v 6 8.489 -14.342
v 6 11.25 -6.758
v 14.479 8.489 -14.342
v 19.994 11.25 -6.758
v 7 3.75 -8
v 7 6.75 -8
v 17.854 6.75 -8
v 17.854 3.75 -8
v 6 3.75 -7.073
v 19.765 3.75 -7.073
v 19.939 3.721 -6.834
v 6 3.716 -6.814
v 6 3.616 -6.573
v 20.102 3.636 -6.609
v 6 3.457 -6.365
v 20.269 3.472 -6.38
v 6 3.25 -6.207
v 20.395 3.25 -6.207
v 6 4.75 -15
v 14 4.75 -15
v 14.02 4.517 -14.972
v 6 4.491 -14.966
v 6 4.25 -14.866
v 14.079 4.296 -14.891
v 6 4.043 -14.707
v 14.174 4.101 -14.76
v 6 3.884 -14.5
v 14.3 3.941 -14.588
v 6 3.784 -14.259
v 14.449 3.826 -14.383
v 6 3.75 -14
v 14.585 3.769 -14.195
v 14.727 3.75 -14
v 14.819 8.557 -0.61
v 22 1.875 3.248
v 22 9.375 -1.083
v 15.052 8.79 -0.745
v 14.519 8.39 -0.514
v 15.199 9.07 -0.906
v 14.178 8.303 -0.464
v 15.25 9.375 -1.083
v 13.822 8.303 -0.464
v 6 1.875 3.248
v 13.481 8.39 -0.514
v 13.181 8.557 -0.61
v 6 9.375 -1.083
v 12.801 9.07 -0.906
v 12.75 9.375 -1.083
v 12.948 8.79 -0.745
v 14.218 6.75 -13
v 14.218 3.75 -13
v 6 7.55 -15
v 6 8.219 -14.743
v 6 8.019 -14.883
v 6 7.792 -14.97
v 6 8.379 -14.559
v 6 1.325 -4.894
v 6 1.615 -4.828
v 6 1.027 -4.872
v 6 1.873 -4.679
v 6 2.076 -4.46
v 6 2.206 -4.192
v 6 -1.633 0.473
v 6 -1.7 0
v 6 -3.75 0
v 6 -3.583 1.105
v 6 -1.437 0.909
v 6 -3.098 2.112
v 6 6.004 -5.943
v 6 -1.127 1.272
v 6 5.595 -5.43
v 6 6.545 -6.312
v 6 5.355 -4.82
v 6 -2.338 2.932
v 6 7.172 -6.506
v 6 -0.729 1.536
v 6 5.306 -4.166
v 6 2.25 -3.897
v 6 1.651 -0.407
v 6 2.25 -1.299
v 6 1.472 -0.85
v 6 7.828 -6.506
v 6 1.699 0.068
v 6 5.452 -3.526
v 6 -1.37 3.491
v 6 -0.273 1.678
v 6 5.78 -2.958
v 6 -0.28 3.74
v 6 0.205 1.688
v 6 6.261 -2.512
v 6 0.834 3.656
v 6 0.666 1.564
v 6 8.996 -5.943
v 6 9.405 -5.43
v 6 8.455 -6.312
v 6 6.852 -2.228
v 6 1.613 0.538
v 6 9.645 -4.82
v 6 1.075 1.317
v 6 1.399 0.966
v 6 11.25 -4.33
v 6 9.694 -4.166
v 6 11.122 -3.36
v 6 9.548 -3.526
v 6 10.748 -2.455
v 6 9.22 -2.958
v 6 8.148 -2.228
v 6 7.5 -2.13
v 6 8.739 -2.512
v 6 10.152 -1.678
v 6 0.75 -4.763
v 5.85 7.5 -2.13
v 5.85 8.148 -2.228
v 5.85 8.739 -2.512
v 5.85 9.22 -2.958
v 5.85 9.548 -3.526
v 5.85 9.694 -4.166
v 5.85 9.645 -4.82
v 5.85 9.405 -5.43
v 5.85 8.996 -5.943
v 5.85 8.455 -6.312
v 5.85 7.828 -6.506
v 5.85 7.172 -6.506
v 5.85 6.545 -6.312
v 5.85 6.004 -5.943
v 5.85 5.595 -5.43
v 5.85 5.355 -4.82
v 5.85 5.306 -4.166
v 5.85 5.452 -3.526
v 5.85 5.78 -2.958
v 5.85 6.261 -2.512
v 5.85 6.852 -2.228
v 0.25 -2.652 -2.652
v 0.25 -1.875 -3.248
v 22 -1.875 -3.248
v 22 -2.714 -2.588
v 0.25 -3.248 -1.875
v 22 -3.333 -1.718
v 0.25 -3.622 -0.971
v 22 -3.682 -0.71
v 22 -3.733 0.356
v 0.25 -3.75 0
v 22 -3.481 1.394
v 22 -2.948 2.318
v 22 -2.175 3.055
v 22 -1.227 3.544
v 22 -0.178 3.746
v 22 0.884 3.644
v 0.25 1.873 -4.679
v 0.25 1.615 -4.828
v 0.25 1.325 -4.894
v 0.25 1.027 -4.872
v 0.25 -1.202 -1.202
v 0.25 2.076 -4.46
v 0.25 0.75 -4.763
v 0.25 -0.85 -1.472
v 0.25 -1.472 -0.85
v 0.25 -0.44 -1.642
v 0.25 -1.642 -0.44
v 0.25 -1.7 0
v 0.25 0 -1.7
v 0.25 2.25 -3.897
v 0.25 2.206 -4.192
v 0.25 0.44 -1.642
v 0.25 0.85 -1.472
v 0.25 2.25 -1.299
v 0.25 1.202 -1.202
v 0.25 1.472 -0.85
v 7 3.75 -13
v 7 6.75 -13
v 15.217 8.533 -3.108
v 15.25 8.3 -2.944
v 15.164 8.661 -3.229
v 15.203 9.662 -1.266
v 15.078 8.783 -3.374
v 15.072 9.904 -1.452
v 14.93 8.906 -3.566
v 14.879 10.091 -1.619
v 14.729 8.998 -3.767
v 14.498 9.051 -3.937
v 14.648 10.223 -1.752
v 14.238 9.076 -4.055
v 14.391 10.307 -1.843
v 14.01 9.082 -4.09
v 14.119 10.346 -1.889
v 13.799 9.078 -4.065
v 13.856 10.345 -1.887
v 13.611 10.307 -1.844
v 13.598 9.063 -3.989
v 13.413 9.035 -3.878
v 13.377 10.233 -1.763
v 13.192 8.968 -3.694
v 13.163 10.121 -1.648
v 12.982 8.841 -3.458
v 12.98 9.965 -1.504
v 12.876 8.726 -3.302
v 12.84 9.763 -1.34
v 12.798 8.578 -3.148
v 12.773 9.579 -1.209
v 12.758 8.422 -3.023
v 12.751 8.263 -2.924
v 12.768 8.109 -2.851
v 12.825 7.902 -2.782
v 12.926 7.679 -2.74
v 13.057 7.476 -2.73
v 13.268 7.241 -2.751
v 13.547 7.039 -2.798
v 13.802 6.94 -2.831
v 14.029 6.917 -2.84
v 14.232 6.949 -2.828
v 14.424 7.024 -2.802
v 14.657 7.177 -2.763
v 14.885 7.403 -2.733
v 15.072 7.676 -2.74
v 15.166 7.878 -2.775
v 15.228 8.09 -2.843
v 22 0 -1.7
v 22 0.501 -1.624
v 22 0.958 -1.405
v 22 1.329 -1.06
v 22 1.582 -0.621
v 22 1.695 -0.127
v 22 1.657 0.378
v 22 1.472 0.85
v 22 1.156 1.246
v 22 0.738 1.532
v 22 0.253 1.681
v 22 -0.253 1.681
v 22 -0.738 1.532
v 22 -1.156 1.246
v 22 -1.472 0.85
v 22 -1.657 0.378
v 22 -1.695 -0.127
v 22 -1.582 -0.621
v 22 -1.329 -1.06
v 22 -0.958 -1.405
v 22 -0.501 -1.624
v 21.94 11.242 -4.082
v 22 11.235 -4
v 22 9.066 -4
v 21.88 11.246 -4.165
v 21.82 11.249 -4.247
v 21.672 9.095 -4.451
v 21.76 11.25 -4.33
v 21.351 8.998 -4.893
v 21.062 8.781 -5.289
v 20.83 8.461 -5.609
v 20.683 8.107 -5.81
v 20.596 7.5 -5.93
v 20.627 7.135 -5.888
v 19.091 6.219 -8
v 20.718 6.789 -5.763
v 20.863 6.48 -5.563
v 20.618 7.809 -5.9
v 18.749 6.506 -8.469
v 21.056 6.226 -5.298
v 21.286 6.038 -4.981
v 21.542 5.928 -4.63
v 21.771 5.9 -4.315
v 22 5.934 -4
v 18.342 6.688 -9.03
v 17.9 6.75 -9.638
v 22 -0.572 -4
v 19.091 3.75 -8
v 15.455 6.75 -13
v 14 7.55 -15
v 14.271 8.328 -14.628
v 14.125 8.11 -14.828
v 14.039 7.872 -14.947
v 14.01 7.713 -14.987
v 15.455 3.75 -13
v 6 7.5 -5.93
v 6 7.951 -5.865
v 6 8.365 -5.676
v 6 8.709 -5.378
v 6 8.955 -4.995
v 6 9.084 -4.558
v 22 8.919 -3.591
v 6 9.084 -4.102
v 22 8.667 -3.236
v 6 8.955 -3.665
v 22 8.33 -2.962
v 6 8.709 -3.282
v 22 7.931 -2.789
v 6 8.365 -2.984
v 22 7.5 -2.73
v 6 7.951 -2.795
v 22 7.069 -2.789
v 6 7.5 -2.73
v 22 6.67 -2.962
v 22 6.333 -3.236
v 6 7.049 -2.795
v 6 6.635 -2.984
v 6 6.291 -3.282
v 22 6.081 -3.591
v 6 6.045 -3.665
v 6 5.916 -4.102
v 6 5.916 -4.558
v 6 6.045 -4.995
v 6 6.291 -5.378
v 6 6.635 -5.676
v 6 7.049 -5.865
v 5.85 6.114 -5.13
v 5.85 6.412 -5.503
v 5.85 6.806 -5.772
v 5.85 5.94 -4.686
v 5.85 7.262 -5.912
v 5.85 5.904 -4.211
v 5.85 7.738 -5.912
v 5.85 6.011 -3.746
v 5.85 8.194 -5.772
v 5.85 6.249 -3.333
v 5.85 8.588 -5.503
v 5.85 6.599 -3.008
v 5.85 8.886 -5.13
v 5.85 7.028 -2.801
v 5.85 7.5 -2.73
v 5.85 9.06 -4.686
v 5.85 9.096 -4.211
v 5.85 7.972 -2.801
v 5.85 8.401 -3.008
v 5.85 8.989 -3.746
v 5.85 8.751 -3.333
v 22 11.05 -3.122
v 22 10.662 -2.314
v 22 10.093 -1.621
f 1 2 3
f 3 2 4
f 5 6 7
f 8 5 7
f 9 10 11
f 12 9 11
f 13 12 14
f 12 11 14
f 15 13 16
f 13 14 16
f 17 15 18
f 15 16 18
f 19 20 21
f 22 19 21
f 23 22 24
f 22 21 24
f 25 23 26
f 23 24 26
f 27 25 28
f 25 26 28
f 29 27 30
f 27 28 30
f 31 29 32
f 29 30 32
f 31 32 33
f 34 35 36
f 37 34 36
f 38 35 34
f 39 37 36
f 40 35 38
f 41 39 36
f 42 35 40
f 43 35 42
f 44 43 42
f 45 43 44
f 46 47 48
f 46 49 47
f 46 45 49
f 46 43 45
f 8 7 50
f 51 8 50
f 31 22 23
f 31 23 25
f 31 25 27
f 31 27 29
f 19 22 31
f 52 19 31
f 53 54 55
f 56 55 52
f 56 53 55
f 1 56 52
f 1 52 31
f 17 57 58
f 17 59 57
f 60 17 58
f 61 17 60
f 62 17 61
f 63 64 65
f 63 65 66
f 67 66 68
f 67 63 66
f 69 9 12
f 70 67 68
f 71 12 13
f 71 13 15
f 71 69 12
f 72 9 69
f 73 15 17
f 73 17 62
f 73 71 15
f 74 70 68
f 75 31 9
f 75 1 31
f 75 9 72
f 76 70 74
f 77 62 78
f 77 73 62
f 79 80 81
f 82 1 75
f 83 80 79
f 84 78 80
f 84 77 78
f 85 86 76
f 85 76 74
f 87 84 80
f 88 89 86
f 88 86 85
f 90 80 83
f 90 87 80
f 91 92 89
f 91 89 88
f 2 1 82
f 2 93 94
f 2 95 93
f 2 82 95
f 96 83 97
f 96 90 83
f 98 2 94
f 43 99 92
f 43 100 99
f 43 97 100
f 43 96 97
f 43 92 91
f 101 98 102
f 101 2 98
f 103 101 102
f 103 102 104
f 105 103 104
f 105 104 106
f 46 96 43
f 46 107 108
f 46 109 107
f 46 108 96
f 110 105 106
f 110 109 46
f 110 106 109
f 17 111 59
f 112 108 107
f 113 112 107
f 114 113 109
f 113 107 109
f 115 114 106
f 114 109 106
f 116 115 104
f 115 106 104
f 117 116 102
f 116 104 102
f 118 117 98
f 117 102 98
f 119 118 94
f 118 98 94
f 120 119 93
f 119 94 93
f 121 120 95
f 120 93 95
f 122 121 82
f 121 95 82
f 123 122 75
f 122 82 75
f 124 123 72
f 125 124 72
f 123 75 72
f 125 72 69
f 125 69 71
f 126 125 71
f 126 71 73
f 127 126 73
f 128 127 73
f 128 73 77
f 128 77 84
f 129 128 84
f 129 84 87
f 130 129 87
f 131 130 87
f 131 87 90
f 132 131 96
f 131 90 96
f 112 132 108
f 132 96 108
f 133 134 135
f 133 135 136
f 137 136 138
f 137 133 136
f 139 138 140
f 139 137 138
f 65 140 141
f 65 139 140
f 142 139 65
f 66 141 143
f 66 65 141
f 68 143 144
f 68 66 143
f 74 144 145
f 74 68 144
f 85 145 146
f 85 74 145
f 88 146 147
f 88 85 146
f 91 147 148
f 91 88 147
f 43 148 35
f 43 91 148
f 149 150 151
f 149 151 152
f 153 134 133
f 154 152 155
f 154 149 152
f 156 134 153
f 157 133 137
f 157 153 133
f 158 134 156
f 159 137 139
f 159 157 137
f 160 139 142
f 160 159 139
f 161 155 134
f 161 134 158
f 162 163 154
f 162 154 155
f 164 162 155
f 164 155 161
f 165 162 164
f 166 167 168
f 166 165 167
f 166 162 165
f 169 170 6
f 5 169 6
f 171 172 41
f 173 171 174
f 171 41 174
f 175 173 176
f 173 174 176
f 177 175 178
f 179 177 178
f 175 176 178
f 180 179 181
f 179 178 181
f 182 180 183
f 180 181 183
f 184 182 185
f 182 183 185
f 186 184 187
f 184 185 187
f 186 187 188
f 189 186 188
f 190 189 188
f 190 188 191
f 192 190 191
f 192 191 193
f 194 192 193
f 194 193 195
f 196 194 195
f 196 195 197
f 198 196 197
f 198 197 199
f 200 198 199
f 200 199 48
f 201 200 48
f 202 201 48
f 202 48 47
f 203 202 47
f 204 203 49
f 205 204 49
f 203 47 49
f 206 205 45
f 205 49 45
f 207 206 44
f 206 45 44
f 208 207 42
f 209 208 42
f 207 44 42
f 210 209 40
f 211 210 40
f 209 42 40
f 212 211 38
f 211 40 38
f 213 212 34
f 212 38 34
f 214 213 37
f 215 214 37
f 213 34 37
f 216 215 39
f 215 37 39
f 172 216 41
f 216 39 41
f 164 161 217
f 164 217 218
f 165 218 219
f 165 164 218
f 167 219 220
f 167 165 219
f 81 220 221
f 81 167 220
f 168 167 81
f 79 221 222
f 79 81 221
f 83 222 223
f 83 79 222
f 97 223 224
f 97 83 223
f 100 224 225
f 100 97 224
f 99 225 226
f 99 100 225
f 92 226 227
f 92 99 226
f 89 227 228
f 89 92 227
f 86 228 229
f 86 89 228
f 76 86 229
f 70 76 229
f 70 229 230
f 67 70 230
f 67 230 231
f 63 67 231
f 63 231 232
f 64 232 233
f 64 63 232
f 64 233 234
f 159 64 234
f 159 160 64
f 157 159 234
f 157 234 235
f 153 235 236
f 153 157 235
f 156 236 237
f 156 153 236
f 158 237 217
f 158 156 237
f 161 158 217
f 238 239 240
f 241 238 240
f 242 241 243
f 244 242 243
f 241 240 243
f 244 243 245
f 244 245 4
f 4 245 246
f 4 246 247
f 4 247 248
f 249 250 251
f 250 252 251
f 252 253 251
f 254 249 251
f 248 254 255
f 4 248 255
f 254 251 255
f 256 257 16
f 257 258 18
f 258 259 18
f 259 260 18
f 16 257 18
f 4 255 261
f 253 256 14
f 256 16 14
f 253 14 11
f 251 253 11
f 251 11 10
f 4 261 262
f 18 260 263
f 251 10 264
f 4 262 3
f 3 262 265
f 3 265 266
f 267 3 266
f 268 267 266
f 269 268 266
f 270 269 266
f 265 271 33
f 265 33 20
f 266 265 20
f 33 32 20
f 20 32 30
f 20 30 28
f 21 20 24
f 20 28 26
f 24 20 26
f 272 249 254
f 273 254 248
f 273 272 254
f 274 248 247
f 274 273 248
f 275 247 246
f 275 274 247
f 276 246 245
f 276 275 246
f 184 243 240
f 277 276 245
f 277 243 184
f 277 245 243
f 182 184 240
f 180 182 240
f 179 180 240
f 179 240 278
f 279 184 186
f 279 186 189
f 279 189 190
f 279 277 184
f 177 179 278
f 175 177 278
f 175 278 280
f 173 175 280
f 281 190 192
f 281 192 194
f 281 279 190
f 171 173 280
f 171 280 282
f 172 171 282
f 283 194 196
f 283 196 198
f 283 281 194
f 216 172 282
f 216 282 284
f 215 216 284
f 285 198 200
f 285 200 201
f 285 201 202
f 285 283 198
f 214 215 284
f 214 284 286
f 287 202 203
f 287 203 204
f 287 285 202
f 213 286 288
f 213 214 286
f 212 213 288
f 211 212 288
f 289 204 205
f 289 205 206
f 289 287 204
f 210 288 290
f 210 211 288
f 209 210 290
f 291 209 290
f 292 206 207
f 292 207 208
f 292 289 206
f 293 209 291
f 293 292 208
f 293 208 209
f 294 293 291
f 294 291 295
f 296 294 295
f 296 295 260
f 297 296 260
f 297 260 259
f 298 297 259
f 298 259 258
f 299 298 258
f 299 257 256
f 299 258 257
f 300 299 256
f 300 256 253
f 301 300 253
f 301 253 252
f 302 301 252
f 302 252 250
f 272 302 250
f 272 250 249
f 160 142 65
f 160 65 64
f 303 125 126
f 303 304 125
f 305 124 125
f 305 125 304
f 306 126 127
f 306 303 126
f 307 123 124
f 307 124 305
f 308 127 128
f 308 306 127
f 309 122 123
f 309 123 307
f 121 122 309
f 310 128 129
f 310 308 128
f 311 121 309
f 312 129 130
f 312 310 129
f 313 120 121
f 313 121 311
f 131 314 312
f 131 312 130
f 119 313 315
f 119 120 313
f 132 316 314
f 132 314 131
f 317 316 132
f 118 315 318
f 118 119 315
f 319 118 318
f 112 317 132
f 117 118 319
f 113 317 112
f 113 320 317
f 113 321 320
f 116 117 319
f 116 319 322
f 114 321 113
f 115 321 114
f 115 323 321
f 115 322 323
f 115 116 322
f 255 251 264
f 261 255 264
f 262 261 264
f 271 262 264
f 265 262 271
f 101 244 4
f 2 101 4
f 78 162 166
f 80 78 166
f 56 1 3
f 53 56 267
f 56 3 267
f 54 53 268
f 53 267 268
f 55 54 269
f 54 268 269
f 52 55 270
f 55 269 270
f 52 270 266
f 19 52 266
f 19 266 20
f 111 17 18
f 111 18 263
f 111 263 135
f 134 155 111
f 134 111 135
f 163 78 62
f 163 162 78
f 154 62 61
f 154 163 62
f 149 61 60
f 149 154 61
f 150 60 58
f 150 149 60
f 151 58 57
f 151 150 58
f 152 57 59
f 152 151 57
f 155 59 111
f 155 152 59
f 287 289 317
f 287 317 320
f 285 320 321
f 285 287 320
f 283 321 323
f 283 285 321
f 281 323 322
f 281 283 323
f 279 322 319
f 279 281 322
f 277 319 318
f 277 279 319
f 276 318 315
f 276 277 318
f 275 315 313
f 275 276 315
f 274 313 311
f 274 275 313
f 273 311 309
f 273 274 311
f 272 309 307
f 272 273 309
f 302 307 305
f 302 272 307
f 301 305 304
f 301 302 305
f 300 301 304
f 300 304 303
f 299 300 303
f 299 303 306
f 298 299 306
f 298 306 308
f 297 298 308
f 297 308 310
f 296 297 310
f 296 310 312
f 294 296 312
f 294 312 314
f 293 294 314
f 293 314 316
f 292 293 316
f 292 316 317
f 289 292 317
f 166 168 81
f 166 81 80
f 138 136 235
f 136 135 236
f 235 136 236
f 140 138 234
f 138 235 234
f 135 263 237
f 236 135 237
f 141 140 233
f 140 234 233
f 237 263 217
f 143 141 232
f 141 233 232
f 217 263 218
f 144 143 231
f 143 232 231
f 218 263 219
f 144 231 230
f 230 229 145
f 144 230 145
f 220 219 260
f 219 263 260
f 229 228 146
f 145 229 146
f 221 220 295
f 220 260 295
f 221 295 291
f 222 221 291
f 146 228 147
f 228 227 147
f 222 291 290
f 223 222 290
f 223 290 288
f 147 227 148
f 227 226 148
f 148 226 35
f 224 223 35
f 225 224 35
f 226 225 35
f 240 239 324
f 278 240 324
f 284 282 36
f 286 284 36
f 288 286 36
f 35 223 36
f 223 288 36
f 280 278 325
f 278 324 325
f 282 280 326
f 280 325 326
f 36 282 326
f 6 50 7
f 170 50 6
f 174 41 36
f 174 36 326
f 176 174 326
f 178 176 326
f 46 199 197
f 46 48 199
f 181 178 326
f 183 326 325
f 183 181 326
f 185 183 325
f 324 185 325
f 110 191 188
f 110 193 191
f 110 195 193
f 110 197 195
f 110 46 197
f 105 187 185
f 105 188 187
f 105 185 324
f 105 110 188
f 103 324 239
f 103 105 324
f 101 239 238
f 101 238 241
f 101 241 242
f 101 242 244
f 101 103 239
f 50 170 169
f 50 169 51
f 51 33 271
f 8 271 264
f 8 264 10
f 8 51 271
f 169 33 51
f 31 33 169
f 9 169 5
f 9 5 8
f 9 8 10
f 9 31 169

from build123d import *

# Parameters (mm, degrees)
SKETCH1_R               = 1.7
SKETCH1_R_2             = 1.6
BOSS_EXTRUDE1_DEPTH     = 22
CUT_EXTRUDE1_DEPTH      = 6
CUT_EXTRUDE2_START      = -2
CUT_EXTRUDE2_DEPTH      = 5
CHAMFER1_SIZE           = 3
CHAMFER1_SIZE2          = 8.242432258
SKETCH4_R               = 2.2
SKETCH4_R_2             = 1.6
BOSS_EXTRUDE2_DEPTH     = 0.15
SKETCH5_R               = 7.371028059
CUT_EXTRUDE3_DEPTH      = 0.25
FILLET1_R               = 1
CUT_EXTRUDE4_DEPTH      = 12.25
CUT_EXTRUDE4_DEPTH_BACK = 4.75
SKETCH8_W               = 8
SKETCH8_H               = 3
BOSS_EXTRUDE4_DEPTH     = 1
SKETCH10_R              = 1.25
CUT_EXTRUDE7_DEPTH      = 4
SKETCH11_W              = 5
SKETCH11_H              = 3
BOSS_EXTRUDE5_DEPTH     = 1


with BuildPart() as part:
    # Sketch1 → Boss-Extrude1 (new body)
    with BuildSketch(Plane(origin=(0, 0, 0), x_dir=(0, 0, -1), z_dir=(1, 0, 0))):
        with BuildLine():
            Line((-3.247595264, 1.875), (1.082531755, 9.375))
            ThreePointArc((1.082531755, 9.375), (2.455127019, 10.747595264), (4.330127019, 11.25))
            Line((4.330127019, 11.25), (15, 11.25))
            Line((15, 11.25), (15, 3.75))
            Line((15, 3.75), (6.495190528, 3.75))
            Line((6.495190528, 3.75), (3.247595264, -1.875))
            ThreePointArc((3.247595264, -1.875), (-1.875, -3.247595264), (-3.247595264, 1.875))
        make_face()
        Circle(SKETCH1_R, mode=Mode.SUBTRACT)
        with Locations((4.330127019, 7.5)):
            Circle(SKETCH1_R_2, mode=Mode.SUBTRACT)
    extrude(amount=BOSS_EXTRUDE1_DEPTH)

    # Sketch2 → Cut-Extrude1 (cut)
    with BuildSketch(Plane.ZY):
        Polygon((-15, 11.25), (5.328677025, 11.25), (5.328677025, -6.255762667), (0, -6.255762667), (0, 0), (-1.299038106, 2.25), (-5.629165125, 2.25), (-15, 2.25), align=None)
    extrude(amount=-CUT_EXTRUDE1_DEPTH, mode=Mode.SUBTRACT)

    # Sketch3 → Cut-Extrude2 (cut)
    with BuildSketch(Plane(origin=(0, 0, -15), x_dir=(-1, 0, 0), z_dir=(0, 0, -1)).offset(CUT_EXTRUDE2_START)):
        with BuildLine():
            Line((-19.5, 3.75), (-19.5, 5.15))
            ThreePointArc((-19.5, 5.15), (-19.03137085, 6.28137085), (-17.9, 6.75))
            Line((-17.9, 6.75), (-10.1, 6.75))
            Line((-10.1, 6.75), (-6, 6.75))
            Line((-6, 6.75), (-6, 3.75))
            Line((-6, 3.75), (-8.5, 3.75))
            Line((-8.5, 3.75), (-19.5, 3.75))
        make_face()
    extrude(amount=-CUT_EXTRUDE2_DEPTH, mode=Mode.SUBTRACT)

    # Chamfer1
    chamfer1_edges = [part.edges().sort_by_distance(p)[0] for p in [
        (14, 11.25, -15),
    ]]
    chamfer1_side = [part.faces().sort_by_distance(p)[0] for p in [
        (14, 7.5, -15),
    ]]
    chamfer(chamfer1_edges, length=CHAMFER1_SIZE, length2=CHAMFER1_SIZE2, reference=chamfer1_side[0])

    # Sketch4 → Boss-Extrude2 (add)
    with BuildSketch(Plane.ZY.offset(-6)):
        with Locations((-4.330127019, 7.5)):
            Circle(SKETCH4_R)
        with Locations((-4.330127019, 7.5)):
            Circle(SKETCH4_R_2, mode=Mode.SUBTRACT)
    extrude(amount=BOSS_EXTRUDE2_DEPTH)

    # Sketch5 → Cut-Extrude3 (cut)
    with BuildSketch(Plane.ZY):
        Circle(SKETCH5_R)
    extrude(amount=-CUT_EXTRUDE3_DEPTH, mode=Mode.SUBTRACT)

    # Fillet1
    fillet1_edges = [part.edges().sort_by_distance(p)[0] for p in [
        (3.125, 2.25, -5.629165125),
        (14, 3.75, -15),
        (14, 3.75, -6.495190528),
        (14, 8.25, -15),
    ]]
    fillet(fillet1_edges, radius=FILLET1_R)

    # Sketch7 → Cut-Extrude4 (cut, two sides)
    with BuildSketch(Plane(origin=(0, 0, 0), x_dir=(1, 0, 0), z_dir=(0, 1, 0))) as cut_extrude4_sk:
        Polygon((22, 4), (14, 15), (22, 15), align=None)
    extrude(amount=CUT_EXTRUDE4_DEPTH, mode=Mode.SUBTRACT)
    extrude(cut_extrude4_sk.sketch, amount=-CUT_EXTRUDE4_DEPTH_BACK, mode=Mode.SUBTRACT)

    # Sketch8 → Boss-Extrude4 (add)
    with BuildSketch(Plane(origin=(16.291891892, 0, -11.848648649), x_dir=(-0.588171698, 0, -0.808736084), z_dir=(0.808736084, 0, -0.588171698))):
        with Locations((-1.339859822, 5.25)):
            Rectangle(SKETCH8_W, SKETCH8_H)
    extrude(amount=-BOSS_EXTRUDE4_DEPTH)

    # Sketch10 → Cut-Extrude7 (cut)
    with BuildSketch(Plane(origin=(0, 1.875, 3.247595264), x_dir=(1, 0, 0), z_dir=(0, 0.5, 0.866025404))):
        with Locations((14, 8.660254038)):
            Circle(SKETCH10_R)
    extrude(amount=-CUT_EXTRUDE7_DEPTH, mode=Mode.SUBTRACT)

    # Sketch11 → Boss-Extrude5 (add)
    with BuildSketch(Plane.ZY.offset(-6)):
        with Locations((-10.5, 5.25)):
            Rectangle(SKETCH11_W, SKETCH11_H)
    extrude(amount=-BOSS_EXTRUDE5_DEPTH)


solid = part.part
